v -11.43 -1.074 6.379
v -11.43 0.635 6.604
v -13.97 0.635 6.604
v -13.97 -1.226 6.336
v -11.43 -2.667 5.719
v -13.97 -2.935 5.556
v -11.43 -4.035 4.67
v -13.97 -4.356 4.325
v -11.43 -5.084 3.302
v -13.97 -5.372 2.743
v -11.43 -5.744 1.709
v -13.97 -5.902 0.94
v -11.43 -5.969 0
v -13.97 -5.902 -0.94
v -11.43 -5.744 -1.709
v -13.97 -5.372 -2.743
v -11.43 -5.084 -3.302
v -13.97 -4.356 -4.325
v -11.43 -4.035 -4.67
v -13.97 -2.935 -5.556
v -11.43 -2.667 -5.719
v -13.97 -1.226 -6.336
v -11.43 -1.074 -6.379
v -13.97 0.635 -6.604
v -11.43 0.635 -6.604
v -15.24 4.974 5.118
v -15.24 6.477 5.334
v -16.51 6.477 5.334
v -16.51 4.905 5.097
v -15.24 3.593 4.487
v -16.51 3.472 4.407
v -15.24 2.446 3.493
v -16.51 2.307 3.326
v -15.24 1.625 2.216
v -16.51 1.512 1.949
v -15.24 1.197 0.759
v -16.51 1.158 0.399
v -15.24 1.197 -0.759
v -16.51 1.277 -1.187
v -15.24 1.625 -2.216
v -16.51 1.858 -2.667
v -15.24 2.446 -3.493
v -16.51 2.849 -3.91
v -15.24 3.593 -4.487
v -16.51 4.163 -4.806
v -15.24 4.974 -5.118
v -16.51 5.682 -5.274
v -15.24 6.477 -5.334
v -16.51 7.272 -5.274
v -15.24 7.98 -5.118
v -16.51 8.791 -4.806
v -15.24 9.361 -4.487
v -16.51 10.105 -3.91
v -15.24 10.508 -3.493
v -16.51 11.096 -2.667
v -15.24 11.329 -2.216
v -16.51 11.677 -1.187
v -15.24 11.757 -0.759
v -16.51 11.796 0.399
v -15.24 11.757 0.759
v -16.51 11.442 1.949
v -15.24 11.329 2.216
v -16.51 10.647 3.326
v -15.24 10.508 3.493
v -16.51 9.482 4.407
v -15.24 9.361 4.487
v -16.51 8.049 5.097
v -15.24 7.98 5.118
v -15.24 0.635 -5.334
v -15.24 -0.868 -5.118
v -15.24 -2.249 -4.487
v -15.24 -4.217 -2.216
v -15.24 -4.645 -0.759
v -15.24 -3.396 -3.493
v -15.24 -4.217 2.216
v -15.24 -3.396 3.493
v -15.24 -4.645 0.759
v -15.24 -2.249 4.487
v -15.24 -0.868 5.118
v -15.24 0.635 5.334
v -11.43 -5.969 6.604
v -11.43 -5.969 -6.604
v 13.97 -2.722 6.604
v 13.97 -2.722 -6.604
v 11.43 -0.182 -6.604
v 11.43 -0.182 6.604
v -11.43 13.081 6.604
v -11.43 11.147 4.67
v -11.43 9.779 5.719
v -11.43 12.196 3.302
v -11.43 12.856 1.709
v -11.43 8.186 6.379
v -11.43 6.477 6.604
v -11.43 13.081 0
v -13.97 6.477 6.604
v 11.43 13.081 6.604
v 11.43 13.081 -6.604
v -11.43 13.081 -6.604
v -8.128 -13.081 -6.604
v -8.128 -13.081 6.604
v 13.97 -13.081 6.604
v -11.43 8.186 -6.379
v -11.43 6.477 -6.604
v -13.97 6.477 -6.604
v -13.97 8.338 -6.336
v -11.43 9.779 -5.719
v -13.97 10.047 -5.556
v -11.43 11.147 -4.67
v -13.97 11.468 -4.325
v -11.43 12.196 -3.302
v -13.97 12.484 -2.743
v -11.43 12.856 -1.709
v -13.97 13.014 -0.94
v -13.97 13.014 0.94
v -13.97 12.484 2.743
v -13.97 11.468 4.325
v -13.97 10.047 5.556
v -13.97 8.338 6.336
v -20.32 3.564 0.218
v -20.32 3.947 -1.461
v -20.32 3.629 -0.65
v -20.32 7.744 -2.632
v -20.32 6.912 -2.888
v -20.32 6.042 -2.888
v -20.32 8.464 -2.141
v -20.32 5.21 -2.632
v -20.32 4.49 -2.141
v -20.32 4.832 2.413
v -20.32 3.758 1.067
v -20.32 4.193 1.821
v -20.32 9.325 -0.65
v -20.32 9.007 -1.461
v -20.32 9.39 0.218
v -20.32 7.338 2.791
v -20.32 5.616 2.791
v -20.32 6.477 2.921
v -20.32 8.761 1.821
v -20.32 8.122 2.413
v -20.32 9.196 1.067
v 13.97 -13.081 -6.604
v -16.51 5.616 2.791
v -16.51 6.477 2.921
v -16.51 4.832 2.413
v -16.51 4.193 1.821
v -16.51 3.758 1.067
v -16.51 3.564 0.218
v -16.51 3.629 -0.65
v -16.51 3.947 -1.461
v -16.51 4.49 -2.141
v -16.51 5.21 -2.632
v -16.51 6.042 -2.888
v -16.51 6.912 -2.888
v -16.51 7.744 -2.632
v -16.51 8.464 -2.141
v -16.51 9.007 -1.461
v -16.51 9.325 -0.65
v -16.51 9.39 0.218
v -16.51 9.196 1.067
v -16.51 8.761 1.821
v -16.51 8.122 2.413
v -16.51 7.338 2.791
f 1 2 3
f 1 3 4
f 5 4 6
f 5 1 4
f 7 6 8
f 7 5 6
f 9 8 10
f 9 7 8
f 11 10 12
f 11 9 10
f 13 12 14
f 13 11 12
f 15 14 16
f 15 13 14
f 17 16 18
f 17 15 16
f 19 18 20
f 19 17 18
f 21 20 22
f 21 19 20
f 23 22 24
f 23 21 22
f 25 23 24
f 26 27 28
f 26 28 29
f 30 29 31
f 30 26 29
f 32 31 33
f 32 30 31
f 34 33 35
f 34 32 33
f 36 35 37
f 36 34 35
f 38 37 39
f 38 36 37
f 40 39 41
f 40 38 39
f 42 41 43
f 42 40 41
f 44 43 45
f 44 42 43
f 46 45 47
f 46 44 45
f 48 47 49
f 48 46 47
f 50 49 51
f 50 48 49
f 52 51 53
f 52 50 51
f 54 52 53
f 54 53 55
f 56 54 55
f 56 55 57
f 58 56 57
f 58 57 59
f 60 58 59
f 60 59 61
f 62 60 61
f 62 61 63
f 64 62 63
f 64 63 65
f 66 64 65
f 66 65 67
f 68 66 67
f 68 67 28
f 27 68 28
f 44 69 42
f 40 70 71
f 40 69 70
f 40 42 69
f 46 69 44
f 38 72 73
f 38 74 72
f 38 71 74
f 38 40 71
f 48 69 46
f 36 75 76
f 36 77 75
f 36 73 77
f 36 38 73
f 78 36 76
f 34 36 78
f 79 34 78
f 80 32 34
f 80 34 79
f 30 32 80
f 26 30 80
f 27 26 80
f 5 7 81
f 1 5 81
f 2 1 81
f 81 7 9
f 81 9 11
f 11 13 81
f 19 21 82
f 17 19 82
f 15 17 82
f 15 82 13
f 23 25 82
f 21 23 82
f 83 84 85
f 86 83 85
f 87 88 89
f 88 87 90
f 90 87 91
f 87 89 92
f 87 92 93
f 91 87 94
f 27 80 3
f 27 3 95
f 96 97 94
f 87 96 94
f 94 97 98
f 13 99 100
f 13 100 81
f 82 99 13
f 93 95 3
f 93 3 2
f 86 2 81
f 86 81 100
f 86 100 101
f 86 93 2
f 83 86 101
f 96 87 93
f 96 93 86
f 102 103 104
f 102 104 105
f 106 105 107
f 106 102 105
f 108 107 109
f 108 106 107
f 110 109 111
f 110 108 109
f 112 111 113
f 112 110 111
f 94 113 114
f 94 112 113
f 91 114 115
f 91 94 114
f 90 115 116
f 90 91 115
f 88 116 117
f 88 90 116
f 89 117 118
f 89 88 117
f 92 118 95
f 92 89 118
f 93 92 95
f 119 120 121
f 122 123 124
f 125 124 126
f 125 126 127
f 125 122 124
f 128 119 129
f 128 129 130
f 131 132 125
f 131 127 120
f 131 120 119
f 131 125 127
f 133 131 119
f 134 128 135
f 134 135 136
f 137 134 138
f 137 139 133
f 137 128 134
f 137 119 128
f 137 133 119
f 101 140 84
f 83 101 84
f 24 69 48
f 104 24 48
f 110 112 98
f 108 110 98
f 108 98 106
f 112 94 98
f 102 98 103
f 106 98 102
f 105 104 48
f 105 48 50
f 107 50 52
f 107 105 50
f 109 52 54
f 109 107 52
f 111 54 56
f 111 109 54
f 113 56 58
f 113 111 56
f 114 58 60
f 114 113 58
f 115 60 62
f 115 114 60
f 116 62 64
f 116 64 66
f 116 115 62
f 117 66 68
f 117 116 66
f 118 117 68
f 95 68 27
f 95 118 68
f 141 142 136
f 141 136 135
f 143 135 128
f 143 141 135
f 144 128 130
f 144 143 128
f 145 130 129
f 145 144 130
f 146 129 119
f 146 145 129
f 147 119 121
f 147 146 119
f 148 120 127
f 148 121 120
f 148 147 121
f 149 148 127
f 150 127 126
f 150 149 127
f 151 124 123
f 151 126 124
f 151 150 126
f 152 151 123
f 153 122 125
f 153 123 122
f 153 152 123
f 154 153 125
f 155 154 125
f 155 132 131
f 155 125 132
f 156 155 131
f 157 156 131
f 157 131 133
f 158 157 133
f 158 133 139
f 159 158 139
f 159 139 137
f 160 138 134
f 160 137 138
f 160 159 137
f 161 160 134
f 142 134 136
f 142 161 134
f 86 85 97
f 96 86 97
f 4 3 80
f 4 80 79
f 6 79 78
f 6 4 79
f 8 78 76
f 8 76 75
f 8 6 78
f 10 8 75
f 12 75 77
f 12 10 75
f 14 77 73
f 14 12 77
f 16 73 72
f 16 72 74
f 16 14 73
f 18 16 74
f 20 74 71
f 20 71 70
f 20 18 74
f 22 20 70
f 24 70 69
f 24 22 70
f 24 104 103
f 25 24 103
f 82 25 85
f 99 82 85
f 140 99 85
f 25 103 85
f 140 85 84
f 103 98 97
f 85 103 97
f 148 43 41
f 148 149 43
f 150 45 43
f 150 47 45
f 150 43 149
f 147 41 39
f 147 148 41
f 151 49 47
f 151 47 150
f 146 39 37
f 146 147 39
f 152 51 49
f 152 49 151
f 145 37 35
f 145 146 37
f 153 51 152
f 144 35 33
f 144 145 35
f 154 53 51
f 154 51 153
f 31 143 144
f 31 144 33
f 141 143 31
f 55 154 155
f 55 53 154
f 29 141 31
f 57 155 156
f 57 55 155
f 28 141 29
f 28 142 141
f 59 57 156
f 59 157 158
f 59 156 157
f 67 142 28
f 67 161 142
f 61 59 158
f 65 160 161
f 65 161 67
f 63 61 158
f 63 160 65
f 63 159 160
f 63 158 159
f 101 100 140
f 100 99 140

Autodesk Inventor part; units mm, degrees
ref_plane "YZ Plane" through (0, 0, 0) normal (1, 0, 0) x (0, 1, 0)
ref_plane "XZ Plane" through (0, 0, 0) normal (0, 1, 0) x (-1, 0, 0)
ref_plane "XY Plane" through (0, 0, 0) normal (0, 0, 1) x (1, 0, 0)
sketch "Sketch1" plane through (0, 0, 0) normal (0, 0, 1) x (1, 0, 0)
  line L0 (-8.128, -13.081) -> (11.43, -13.081)
  line L1 (11.43, -0.182) -> (11.43, 13.081)
  line L2 (11.43, 13.081) -> (-11.43, 13.081)
  line L3 (-11.43, 13.081) -> (-11.43, -5.969)
  line L4 (11.43, -13.081) -> (-8.128, -13.081)
  line L5 (-8.128, -13.081) -> (-11.43, -5.969)
  line L6 (11.43, -13.081) -> (13.97, -13.081)
  line L7 (13.97, -13.081) -> (13.97, -2.722)
  line L8 (13.97, -2.722) -> (11.43, -0.182)
  point P0 (0, 0)
  point P1 (0, -13.081)
  point P2 (-11.43, 0)
  dimension "d0" = 22.86
  dimension "d1" = 26.162
  dimension "d2" = 19.558
  dimension "d3" = 7.112
  dimension "d4" = 135
  dimension "d5" = 2.54
extrude "Extrusion1" add sketch "Sketch1" along normal mid plane 13.208
sketch "Sketch2" plane through (-11.43, -5.969, -6.604) normal (-1, 0, 0) x (0, 0, 1)
  line L0 (13.208, 0) -> (13.208, 19.05) projected
  line L1 (0, 19.05) -> (13.208, 19.05) projected
  line L2 (0, 19.05) -> (0, 0) projected
  line L3 (0, 0) -> (13.208, 0) projected
  arc A0 (0, 6.604) -> (13.208, 6.604) centre (6.604, 6.604) ccw
  arc A1 (13.208, 12.446) -> (0, 12.446) centre (6.604, 12.446) ccw
  point P0 (6.604, 5.969)
extrude "Extrusion2" add sketch "Sketch2" along normal blind 3.81 contours A0 L2 A1 L0
chamfer "Chamfer1" distance 1.27 angle 45 4 edges at (-15.24, 13.081, 0) (-15.24, 3.556, 6.604) (-15.24, -5.969, 0) (-15.24, 3.556, -6.604)
sketch "Sketch4" plane through (-15.24, -5.969, -6.604) normal (-1, 0, 0) x (0, 0, 1)
  arc A0 (11.938, 12.446) -> (1.27, 12.446) centre (6.604, 12.446) ccw projected
  circle A1 centre (6.604, 12.446) radius 5.334
  point P0 (6.604, 5.969)
extrude "Extrusion3" add sketch "Sketch4" along normal blind 1.27
sketch "Sketch5" plane through (-16.51, 6.477, 0) normal (-1, 0, 0) x (0, 0, 1)
  circle A0 centre (0, 0) radius 5.334 projected
  circle A1 centre (0, 0) radius 2.921
  point P0 (0, -6.477)
  dimension "d15" = 5.842
extrude "Extrusion4" add sketch "Sketch5" along normal blind 3.81 contours A1
properties part number "Servo"
